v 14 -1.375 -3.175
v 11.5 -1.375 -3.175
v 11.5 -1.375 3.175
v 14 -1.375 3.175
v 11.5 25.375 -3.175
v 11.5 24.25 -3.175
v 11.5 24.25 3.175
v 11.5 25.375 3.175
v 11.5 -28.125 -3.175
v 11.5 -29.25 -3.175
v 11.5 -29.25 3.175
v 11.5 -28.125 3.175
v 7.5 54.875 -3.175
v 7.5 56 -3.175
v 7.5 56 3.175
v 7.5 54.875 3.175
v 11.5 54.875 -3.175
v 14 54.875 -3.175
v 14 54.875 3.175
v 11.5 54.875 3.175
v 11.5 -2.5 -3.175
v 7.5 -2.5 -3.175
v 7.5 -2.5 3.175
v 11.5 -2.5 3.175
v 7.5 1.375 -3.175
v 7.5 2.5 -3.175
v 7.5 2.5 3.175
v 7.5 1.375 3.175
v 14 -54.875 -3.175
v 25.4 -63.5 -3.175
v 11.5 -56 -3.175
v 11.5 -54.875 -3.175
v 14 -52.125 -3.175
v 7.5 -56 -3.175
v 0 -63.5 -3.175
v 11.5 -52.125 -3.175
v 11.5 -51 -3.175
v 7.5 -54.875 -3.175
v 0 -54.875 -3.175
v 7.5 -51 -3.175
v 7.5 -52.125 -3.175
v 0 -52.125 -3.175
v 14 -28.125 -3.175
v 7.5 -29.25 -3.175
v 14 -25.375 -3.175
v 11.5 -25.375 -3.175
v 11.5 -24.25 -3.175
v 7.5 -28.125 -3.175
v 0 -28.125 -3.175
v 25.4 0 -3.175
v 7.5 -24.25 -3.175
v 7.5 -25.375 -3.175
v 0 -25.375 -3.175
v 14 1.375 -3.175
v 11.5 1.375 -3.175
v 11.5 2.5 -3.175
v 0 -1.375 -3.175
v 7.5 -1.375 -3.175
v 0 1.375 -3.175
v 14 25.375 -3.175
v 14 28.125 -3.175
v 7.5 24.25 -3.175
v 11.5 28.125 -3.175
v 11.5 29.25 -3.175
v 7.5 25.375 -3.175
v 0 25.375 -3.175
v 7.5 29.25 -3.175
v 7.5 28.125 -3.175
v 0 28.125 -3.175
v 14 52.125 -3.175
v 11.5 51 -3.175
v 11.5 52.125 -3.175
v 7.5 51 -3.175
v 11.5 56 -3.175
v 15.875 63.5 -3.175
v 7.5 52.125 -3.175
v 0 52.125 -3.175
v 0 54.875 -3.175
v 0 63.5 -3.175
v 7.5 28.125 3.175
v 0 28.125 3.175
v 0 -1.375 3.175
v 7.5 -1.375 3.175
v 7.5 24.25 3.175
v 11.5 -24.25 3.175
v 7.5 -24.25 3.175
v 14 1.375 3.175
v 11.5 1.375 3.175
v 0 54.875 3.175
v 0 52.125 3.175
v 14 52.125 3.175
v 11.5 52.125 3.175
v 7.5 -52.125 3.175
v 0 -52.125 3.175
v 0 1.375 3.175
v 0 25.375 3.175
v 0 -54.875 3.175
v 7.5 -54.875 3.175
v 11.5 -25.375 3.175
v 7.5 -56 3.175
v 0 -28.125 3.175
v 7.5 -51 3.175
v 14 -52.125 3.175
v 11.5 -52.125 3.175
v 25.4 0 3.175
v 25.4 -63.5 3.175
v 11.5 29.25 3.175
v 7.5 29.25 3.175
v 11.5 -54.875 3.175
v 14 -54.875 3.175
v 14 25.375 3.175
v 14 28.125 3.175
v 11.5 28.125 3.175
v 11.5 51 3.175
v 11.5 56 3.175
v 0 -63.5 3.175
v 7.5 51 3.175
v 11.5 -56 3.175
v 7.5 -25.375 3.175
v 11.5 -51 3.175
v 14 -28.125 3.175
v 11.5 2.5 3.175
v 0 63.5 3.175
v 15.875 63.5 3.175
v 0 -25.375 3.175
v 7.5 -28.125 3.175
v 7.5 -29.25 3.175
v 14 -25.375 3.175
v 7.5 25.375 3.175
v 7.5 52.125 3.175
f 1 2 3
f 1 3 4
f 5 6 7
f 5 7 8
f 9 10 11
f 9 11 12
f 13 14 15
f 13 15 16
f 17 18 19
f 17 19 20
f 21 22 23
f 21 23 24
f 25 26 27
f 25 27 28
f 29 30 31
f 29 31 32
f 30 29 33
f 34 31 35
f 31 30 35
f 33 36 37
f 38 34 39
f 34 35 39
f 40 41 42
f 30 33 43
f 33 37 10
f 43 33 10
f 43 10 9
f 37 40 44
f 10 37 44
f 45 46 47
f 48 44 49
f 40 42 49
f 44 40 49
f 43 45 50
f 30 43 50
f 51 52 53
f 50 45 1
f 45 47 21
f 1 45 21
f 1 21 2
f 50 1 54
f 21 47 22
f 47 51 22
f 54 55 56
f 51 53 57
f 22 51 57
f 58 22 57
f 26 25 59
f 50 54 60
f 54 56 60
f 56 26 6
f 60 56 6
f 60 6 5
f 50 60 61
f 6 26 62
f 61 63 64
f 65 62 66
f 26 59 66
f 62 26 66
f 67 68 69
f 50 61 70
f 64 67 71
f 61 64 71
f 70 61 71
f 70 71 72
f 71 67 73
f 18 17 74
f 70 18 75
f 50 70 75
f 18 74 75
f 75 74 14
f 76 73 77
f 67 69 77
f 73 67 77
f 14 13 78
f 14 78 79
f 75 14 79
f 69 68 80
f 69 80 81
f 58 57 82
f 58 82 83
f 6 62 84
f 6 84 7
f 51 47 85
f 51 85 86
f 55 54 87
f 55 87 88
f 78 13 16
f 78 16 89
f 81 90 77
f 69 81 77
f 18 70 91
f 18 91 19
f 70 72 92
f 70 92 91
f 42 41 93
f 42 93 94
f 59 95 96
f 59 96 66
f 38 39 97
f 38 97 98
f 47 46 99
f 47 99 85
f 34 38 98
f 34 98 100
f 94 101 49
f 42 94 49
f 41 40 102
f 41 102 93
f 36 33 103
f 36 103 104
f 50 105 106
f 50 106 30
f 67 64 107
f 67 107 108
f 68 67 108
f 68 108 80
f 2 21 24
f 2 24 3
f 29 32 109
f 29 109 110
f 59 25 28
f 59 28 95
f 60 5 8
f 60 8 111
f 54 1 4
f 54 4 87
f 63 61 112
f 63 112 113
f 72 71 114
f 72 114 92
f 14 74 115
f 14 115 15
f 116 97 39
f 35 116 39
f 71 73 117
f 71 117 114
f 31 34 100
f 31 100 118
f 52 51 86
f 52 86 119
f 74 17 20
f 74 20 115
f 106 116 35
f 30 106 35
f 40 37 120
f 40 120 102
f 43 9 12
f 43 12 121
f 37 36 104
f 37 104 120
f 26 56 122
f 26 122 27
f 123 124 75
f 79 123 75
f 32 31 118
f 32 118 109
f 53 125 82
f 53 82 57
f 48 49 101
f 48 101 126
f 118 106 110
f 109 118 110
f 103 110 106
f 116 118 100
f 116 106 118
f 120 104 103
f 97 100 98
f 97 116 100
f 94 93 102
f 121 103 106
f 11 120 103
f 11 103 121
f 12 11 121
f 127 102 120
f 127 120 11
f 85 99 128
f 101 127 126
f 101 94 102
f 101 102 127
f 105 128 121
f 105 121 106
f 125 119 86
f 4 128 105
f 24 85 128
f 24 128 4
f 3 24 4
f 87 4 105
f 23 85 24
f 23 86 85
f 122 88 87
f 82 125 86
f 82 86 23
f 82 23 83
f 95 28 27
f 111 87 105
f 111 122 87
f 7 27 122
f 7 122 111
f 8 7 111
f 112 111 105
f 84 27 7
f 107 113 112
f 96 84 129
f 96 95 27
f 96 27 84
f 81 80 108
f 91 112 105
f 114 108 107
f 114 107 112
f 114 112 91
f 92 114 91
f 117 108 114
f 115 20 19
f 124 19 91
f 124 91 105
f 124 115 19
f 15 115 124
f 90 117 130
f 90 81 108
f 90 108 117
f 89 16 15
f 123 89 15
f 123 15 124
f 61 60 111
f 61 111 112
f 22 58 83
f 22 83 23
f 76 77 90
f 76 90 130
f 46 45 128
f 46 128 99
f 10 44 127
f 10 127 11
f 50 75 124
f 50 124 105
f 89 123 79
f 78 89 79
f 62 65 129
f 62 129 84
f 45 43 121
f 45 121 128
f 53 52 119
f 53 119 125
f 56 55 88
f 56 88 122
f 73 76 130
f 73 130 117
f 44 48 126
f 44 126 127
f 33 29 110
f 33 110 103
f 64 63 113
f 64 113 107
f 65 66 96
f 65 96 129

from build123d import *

# Parameters (mm, degrees)
SKETCH1_W               = 6.35
SKETCH1_H               = 127
BOSS_EXTRUDE1_DEPTH     = 25.4
CUT_EXTRUDE1_DEPTH      = 69.685751798
CUT_EXTRUDE1_DEPTH_BACK = 69.685751798


with BuildPart() as part:
    # Sketch1 → Boss-Extrude1 (new body)
    with BuildSketch(Plane(origin=(0, 0, 0), x_dir=(0, 0, -1), z_dir=(1, 0, 0))):
        Rectangle(SKETCH1_W, SKETCH1_H)
    extrude(amount=BOSS_EXTRUDE1_DEPTH)

    # Sketch4 → Cut-Extrude1 (cut, two sides: drawn at the far end of the back side and taken through both)
    with BuildSketch(Plane.XY.offset(3.175).offset(-CUT_EXTRUDE1_DEPTH_BACK)):
        Polygon((7.5, 54.875), (0, 54.875), (0, 52.125), (7.5, 52.125), (7.5, 51), (11.5, 51), (11.5, 52.125), (14, 52.125), (14, 54.875), (11.5, 54.875), (11.5, 56), (7.5, 56), align=None)
        Polygon((25.4, 63.5), (15.875, 63.5), (25.4, 0), align=None)
        Polygon((7.5, 28.125), (0, 28.125), (0, 25.375), (7.5, 25.375), (7.5, 24.25), (11.5, 24.25), (11.5, 25.375), (14, 25.375), (14, 28.125), (11.5, 28.125), (11.5, 29.25), (7.5, 29.25), align=None)
        Polygon((7.5, 1.375), (0, 1.375), (0, -1.375), (7.5, -1.375), (7.5, -2.5), (11.5, -2.5), (11.5, -1.375), (14, -1.375), (14, 1.375), (11.5, 1.375), (11.5, 2.5), (7.5, 2.5), align=None)
        Polygon((7.5, -25.375), (0, -25.375), (0, -28.125), (7.5, -28.125), (7.5, -29.25), (11.5, -29.25), (11.5, -28.125), (14, -28.125), (14, -25.375), (11.5, -25.375), (11.5, -24.25), (7.5, -24.25), align=None)
        Polygon((7.5, -52.125), (0, -52.125), (0, -54.875), (7.5, -54.875), (7.5, -56), (11.5, -56), (11.5, -54.875), (14, -54.875), (14, -52.125), (11.5, -52.125), (11.5, -51), (7.5, -51), align=None)
    extrude(amount=CUT_EXTRUDE1_DEPTH + CUT_EXTRUDE1_DEPTH_BACK, mode=Mode.SUBTRACT)


solid = part.part
